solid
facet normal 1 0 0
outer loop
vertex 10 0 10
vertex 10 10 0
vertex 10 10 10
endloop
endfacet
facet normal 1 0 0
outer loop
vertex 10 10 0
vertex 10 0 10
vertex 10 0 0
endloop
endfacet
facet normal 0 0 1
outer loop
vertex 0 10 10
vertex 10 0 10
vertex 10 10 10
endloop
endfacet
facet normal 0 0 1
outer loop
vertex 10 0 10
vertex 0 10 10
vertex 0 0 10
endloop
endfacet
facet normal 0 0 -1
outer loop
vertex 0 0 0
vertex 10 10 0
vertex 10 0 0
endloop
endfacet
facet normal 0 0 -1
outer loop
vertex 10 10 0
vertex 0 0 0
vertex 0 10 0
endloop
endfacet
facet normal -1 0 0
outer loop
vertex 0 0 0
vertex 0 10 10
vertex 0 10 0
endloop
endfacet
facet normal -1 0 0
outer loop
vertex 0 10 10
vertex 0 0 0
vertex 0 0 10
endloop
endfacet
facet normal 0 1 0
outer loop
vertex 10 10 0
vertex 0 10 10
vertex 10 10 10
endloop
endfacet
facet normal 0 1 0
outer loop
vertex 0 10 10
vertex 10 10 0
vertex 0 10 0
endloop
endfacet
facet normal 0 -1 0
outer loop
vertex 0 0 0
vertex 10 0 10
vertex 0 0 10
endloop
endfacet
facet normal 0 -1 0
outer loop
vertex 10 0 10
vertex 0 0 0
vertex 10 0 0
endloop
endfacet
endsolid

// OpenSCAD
/* OpenSCAD Workshop

Example showing variables.

*/

//We can create a cube 10x10x10mm.
cube([10,10,10]);

//Declaring a variable called x might save us some characters.
x = 10;
cube([x,x,x]);

//Look ma, a vector!
y = [10,10,10];
cube(y);

/*When OpenSCAD parses the files it will take the last assignment of
  a variable to be it's value. The following demonstrates this fact. 

  Run with the last two lines commented out and you will see. 
	ECHO: 1
	ECHO: 2
	ECHO: 3
	ECHO: 2

  With the last two lines uncommented it will display the following.
	WARNING: Ignoring unknown variable 'b'.
	ECHO: 1
	ECHO: undef
	ECHO: undef
	ECHO: undef
	
  This is because the parse will look for the last instance of a variable and 
  ignore the previous definitions. 
	
*/

a = 1;
b = 2;
echo(a);
echo(b);
c = a + b;
echo(c);
//b = a+b;
//echo(b);


//Variables can also be strings.
hi = "Hello world!";
echo(hi);
